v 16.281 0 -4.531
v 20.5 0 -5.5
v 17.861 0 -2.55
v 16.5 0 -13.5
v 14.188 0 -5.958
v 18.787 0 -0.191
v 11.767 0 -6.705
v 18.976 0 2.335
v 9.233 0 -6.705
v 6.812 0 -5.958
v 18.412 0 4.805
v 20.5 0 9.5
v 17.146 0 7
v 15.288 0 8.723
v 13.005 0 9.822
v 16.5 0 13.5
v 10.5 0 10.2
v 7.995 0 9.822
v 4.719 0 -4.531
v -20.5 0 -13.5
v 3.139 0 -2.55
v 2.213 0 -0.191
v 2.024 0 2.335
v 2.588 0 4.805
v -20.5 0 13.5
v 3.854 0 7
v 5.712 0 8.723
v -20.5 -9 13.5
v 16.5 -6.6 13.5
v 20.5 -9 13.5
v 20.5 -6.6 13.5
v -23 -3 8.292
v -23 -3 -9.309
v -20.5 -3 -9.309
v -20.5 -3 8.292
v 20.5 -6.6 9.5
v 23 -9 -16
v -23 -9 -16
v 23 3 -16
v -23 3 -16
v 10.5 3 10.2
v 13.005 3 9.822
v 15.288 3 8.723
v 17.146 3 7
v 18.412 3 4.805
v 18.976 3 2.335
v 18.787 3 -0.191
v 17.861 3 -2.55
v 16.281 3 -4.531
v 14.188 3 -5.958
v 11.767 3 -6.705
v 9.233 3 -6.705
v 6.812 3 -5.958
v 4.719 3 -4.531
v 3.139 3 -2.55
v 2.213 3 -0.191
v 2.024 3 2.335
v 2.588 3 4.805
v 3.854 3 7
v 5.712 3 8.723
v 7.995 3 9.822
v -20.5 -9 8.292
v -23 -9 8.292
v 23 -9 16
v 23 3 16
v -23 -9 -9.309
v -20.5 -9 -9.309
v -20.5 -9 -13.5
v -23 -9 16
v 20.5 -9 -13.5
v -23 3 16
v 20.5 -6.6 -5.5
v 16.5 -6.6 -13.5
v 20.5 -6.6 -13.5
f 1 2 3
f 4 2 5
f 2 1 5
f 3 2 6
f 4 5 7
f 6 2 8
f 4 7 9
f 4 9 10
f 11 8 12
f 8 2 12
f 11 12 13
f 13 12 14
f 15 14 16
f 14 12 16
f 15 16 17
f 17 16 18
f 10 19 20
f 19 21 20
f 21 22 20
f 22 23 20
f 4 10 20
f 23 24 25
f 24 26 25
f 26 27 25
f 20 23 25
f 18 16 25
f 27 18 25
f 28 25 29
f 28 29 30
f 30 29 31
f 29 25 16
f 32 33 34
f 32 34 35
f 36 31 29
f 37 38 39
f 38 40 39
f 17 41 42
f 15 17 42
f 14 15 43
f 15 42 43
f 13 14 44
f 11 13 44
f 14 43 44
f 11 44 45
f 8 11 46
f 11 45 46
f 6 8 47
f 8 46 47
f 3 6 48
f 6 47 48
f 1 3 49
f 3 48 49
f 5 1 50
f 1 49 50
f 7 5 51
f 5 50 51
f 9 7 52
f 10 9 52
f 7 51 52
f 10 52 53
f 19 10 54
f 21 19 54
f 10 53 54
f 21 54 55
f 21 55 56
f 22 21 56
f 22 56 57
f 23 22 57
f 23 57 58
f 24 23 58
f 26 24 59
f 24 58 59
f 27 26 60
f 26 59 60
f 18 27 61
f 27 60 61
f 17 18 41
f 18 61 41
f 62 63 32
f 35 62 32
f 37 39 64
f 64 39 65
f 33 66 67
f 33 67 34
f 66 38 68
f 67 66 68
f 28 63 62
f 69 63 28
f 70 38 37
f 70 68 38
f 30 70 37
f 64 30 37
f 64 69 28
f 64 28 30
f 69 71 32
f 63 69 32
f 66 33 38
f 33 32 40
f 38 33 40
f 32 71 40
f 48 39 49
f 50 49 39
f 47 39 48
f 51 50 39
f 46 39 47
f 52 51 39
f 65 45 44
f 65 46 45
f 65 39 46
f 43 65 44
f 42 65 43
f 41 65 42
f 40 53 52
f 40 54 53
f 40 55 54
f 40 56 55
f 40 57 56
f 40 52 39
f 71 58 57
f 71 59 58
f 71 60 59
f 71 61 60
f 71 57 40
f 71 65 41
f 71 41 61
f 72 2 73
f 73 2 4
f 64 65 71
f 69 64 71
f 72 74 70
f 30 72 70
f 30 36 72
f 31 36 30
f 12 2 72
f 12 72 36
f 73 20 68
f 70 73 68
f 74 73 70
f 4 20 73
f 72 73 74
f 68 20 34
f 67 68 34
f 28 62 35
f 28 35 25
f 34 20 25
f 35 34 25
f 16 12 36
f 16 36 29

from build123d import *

# Parameters (mm, degrees)
SKETCH2_W           = 40
SKETCH2_H           = 26
BOSS_EXTRUDE1_DEPTH = 3
SKETCH3_R           = 8.5
CUT_EXTRUDE1_DEPTH  = 3
SKETCH4_W           = 26
SKETCH4_H           = 3
BOSS_EXTRUDE2_DEPTH = 3
SKETCH5_W           = 26
SKETCH5_H           = 3
BOSS_EXTRUDE3_DEPTH = 3
SKETCH6_W           = 46
SKETCH6_H           = 3
BOSS_EXTRUDE4_DEPTH = 3
SKETCH7_W           = 46
SKETCH7_H           = 3
BOSS_EXTRUDE5_DEPTH = 3
SKETCH8_W           = 41
SKETCH8_H           = 27
BOSS_EXTRUDE6_DEPTH = 9
BOSS_EXTRUDE7_DEPTH = 6.6
SKETCH10_W          = 17.601141336
SKETCH10_H          = 6
CUT_EXTRUDE2_DEPTH  = 6.6


with BuildPart() as part:
    # Sketch2 → Boss-Extrude1 (new body)
    with BuildSketch(Plane(origin=(0, 0, 0), x_dir=(1, 0, 0), z_dir=(0, 1, 0))):
        Rectangle(SKETCH2_W, SKETCH2_H)
    extrude(amount=BOSS_EXTRUDE1_DEPTH)

    # Sketch3 → Cut-Extrude1 (cut)
    with BuildSketch(Plane(origin=(0, 3, 0), x_dir=(1, 0, 0), z_dir=(0, 1, 0))):
        with Locations(Location((10.5, -1.7, 0), (0, 0, 270))):
            Circle(SKETCH3_R)
    extrude(amount=-CUT_EXTRUDE1_DEPTH, mode=Mode.SUBTRACT)

    # Sketch4 → Boss-Extrude2 (add)
    with BuildSketch(Plane(origin=(20, 0, 0), x_dir=(0, 0, -1), z_dir=(1, 0, 0))):
        with Locations((0, 1.5)):
            Rectangle(SKETCH4_W, SKETCH4_H)
    extrude(amount=BOSS_EXTRUDE2_DEPTH)

    # Sketch5 → Boss-Extrude3 (add)
    with BuildSketch(Plane.ZY.offset(20)):
        with Locations((0, 1.5)):
            Rectangle(SKETCH5_W, SKETCH5_H)
    extrude(amount=BOSS_EXTRUDE3_DEPTH)

    # Sketch6 → Boss-Extrude4 (add)
    with BuildSketch(Plane.XY.offset(13)):
        with Locations((0, 1.5)):
            Rectangle(SKETCH6_W, SKETCH6_H)
    extrude(amount=BOSS_EXTRUDE4_DEPTH)

    # Sketch7 → Boss-Extrude5 (add)
    with BuildSketch(Plane(origin=(0, 0, -13), x_dir=(-1, 0, 0), z_dir=(0, 0, -1))):
        with Locations((0, 1.5)):
            Rectangle(SKETCH7_W, SKETCH7_H)
    extrude(amount=BOSS_EXTRUDE5_DEPTH)

    # Sketch8 → Boss-Extrude6 (add)
    with BuildSketch(Plane.XZ):
        Polygon((23, 13), (23, 16), (20, 16), (-20, 16), (-23, 16), (-23, 13), (-23, -13), (-23, -16), (-20, -16), (20, -16), (23, -16), (23, -13), align=None)
        Rectangle(SKETCH8_W, SKETCH8_H, mode=Mode.SUBTRACT)
    extrude(amount=BOSS_EXTRUDE6_DEPTH)

    # Sketch9 → Boss-Extrude7 (add)
    with BuildSketch(Plane.XZ):
        Polygon((20.5, 9.5), (16.5, 13.5), (20.5, 13.5), align=None)
        Polygon((20.5, -5.5), (16.5, -13.5), (20.5, -13.5), align=None)
    extrude(amount=BOSS_EXTRUDE7_DEPTH)

    # Sketch10 → Cut-Extrude2 (cut)
    with BuildSketch(Plane.ZY.offset(23)):
        with Locations((-0.508683185, -6)):
            Rectangle(SKETCH10_W, SKETCH10_H)
    extrude(amount=-CUT_EXTRUDE2_DEPTH, mode=Mode.SUBTRACT)


solid = part.part
